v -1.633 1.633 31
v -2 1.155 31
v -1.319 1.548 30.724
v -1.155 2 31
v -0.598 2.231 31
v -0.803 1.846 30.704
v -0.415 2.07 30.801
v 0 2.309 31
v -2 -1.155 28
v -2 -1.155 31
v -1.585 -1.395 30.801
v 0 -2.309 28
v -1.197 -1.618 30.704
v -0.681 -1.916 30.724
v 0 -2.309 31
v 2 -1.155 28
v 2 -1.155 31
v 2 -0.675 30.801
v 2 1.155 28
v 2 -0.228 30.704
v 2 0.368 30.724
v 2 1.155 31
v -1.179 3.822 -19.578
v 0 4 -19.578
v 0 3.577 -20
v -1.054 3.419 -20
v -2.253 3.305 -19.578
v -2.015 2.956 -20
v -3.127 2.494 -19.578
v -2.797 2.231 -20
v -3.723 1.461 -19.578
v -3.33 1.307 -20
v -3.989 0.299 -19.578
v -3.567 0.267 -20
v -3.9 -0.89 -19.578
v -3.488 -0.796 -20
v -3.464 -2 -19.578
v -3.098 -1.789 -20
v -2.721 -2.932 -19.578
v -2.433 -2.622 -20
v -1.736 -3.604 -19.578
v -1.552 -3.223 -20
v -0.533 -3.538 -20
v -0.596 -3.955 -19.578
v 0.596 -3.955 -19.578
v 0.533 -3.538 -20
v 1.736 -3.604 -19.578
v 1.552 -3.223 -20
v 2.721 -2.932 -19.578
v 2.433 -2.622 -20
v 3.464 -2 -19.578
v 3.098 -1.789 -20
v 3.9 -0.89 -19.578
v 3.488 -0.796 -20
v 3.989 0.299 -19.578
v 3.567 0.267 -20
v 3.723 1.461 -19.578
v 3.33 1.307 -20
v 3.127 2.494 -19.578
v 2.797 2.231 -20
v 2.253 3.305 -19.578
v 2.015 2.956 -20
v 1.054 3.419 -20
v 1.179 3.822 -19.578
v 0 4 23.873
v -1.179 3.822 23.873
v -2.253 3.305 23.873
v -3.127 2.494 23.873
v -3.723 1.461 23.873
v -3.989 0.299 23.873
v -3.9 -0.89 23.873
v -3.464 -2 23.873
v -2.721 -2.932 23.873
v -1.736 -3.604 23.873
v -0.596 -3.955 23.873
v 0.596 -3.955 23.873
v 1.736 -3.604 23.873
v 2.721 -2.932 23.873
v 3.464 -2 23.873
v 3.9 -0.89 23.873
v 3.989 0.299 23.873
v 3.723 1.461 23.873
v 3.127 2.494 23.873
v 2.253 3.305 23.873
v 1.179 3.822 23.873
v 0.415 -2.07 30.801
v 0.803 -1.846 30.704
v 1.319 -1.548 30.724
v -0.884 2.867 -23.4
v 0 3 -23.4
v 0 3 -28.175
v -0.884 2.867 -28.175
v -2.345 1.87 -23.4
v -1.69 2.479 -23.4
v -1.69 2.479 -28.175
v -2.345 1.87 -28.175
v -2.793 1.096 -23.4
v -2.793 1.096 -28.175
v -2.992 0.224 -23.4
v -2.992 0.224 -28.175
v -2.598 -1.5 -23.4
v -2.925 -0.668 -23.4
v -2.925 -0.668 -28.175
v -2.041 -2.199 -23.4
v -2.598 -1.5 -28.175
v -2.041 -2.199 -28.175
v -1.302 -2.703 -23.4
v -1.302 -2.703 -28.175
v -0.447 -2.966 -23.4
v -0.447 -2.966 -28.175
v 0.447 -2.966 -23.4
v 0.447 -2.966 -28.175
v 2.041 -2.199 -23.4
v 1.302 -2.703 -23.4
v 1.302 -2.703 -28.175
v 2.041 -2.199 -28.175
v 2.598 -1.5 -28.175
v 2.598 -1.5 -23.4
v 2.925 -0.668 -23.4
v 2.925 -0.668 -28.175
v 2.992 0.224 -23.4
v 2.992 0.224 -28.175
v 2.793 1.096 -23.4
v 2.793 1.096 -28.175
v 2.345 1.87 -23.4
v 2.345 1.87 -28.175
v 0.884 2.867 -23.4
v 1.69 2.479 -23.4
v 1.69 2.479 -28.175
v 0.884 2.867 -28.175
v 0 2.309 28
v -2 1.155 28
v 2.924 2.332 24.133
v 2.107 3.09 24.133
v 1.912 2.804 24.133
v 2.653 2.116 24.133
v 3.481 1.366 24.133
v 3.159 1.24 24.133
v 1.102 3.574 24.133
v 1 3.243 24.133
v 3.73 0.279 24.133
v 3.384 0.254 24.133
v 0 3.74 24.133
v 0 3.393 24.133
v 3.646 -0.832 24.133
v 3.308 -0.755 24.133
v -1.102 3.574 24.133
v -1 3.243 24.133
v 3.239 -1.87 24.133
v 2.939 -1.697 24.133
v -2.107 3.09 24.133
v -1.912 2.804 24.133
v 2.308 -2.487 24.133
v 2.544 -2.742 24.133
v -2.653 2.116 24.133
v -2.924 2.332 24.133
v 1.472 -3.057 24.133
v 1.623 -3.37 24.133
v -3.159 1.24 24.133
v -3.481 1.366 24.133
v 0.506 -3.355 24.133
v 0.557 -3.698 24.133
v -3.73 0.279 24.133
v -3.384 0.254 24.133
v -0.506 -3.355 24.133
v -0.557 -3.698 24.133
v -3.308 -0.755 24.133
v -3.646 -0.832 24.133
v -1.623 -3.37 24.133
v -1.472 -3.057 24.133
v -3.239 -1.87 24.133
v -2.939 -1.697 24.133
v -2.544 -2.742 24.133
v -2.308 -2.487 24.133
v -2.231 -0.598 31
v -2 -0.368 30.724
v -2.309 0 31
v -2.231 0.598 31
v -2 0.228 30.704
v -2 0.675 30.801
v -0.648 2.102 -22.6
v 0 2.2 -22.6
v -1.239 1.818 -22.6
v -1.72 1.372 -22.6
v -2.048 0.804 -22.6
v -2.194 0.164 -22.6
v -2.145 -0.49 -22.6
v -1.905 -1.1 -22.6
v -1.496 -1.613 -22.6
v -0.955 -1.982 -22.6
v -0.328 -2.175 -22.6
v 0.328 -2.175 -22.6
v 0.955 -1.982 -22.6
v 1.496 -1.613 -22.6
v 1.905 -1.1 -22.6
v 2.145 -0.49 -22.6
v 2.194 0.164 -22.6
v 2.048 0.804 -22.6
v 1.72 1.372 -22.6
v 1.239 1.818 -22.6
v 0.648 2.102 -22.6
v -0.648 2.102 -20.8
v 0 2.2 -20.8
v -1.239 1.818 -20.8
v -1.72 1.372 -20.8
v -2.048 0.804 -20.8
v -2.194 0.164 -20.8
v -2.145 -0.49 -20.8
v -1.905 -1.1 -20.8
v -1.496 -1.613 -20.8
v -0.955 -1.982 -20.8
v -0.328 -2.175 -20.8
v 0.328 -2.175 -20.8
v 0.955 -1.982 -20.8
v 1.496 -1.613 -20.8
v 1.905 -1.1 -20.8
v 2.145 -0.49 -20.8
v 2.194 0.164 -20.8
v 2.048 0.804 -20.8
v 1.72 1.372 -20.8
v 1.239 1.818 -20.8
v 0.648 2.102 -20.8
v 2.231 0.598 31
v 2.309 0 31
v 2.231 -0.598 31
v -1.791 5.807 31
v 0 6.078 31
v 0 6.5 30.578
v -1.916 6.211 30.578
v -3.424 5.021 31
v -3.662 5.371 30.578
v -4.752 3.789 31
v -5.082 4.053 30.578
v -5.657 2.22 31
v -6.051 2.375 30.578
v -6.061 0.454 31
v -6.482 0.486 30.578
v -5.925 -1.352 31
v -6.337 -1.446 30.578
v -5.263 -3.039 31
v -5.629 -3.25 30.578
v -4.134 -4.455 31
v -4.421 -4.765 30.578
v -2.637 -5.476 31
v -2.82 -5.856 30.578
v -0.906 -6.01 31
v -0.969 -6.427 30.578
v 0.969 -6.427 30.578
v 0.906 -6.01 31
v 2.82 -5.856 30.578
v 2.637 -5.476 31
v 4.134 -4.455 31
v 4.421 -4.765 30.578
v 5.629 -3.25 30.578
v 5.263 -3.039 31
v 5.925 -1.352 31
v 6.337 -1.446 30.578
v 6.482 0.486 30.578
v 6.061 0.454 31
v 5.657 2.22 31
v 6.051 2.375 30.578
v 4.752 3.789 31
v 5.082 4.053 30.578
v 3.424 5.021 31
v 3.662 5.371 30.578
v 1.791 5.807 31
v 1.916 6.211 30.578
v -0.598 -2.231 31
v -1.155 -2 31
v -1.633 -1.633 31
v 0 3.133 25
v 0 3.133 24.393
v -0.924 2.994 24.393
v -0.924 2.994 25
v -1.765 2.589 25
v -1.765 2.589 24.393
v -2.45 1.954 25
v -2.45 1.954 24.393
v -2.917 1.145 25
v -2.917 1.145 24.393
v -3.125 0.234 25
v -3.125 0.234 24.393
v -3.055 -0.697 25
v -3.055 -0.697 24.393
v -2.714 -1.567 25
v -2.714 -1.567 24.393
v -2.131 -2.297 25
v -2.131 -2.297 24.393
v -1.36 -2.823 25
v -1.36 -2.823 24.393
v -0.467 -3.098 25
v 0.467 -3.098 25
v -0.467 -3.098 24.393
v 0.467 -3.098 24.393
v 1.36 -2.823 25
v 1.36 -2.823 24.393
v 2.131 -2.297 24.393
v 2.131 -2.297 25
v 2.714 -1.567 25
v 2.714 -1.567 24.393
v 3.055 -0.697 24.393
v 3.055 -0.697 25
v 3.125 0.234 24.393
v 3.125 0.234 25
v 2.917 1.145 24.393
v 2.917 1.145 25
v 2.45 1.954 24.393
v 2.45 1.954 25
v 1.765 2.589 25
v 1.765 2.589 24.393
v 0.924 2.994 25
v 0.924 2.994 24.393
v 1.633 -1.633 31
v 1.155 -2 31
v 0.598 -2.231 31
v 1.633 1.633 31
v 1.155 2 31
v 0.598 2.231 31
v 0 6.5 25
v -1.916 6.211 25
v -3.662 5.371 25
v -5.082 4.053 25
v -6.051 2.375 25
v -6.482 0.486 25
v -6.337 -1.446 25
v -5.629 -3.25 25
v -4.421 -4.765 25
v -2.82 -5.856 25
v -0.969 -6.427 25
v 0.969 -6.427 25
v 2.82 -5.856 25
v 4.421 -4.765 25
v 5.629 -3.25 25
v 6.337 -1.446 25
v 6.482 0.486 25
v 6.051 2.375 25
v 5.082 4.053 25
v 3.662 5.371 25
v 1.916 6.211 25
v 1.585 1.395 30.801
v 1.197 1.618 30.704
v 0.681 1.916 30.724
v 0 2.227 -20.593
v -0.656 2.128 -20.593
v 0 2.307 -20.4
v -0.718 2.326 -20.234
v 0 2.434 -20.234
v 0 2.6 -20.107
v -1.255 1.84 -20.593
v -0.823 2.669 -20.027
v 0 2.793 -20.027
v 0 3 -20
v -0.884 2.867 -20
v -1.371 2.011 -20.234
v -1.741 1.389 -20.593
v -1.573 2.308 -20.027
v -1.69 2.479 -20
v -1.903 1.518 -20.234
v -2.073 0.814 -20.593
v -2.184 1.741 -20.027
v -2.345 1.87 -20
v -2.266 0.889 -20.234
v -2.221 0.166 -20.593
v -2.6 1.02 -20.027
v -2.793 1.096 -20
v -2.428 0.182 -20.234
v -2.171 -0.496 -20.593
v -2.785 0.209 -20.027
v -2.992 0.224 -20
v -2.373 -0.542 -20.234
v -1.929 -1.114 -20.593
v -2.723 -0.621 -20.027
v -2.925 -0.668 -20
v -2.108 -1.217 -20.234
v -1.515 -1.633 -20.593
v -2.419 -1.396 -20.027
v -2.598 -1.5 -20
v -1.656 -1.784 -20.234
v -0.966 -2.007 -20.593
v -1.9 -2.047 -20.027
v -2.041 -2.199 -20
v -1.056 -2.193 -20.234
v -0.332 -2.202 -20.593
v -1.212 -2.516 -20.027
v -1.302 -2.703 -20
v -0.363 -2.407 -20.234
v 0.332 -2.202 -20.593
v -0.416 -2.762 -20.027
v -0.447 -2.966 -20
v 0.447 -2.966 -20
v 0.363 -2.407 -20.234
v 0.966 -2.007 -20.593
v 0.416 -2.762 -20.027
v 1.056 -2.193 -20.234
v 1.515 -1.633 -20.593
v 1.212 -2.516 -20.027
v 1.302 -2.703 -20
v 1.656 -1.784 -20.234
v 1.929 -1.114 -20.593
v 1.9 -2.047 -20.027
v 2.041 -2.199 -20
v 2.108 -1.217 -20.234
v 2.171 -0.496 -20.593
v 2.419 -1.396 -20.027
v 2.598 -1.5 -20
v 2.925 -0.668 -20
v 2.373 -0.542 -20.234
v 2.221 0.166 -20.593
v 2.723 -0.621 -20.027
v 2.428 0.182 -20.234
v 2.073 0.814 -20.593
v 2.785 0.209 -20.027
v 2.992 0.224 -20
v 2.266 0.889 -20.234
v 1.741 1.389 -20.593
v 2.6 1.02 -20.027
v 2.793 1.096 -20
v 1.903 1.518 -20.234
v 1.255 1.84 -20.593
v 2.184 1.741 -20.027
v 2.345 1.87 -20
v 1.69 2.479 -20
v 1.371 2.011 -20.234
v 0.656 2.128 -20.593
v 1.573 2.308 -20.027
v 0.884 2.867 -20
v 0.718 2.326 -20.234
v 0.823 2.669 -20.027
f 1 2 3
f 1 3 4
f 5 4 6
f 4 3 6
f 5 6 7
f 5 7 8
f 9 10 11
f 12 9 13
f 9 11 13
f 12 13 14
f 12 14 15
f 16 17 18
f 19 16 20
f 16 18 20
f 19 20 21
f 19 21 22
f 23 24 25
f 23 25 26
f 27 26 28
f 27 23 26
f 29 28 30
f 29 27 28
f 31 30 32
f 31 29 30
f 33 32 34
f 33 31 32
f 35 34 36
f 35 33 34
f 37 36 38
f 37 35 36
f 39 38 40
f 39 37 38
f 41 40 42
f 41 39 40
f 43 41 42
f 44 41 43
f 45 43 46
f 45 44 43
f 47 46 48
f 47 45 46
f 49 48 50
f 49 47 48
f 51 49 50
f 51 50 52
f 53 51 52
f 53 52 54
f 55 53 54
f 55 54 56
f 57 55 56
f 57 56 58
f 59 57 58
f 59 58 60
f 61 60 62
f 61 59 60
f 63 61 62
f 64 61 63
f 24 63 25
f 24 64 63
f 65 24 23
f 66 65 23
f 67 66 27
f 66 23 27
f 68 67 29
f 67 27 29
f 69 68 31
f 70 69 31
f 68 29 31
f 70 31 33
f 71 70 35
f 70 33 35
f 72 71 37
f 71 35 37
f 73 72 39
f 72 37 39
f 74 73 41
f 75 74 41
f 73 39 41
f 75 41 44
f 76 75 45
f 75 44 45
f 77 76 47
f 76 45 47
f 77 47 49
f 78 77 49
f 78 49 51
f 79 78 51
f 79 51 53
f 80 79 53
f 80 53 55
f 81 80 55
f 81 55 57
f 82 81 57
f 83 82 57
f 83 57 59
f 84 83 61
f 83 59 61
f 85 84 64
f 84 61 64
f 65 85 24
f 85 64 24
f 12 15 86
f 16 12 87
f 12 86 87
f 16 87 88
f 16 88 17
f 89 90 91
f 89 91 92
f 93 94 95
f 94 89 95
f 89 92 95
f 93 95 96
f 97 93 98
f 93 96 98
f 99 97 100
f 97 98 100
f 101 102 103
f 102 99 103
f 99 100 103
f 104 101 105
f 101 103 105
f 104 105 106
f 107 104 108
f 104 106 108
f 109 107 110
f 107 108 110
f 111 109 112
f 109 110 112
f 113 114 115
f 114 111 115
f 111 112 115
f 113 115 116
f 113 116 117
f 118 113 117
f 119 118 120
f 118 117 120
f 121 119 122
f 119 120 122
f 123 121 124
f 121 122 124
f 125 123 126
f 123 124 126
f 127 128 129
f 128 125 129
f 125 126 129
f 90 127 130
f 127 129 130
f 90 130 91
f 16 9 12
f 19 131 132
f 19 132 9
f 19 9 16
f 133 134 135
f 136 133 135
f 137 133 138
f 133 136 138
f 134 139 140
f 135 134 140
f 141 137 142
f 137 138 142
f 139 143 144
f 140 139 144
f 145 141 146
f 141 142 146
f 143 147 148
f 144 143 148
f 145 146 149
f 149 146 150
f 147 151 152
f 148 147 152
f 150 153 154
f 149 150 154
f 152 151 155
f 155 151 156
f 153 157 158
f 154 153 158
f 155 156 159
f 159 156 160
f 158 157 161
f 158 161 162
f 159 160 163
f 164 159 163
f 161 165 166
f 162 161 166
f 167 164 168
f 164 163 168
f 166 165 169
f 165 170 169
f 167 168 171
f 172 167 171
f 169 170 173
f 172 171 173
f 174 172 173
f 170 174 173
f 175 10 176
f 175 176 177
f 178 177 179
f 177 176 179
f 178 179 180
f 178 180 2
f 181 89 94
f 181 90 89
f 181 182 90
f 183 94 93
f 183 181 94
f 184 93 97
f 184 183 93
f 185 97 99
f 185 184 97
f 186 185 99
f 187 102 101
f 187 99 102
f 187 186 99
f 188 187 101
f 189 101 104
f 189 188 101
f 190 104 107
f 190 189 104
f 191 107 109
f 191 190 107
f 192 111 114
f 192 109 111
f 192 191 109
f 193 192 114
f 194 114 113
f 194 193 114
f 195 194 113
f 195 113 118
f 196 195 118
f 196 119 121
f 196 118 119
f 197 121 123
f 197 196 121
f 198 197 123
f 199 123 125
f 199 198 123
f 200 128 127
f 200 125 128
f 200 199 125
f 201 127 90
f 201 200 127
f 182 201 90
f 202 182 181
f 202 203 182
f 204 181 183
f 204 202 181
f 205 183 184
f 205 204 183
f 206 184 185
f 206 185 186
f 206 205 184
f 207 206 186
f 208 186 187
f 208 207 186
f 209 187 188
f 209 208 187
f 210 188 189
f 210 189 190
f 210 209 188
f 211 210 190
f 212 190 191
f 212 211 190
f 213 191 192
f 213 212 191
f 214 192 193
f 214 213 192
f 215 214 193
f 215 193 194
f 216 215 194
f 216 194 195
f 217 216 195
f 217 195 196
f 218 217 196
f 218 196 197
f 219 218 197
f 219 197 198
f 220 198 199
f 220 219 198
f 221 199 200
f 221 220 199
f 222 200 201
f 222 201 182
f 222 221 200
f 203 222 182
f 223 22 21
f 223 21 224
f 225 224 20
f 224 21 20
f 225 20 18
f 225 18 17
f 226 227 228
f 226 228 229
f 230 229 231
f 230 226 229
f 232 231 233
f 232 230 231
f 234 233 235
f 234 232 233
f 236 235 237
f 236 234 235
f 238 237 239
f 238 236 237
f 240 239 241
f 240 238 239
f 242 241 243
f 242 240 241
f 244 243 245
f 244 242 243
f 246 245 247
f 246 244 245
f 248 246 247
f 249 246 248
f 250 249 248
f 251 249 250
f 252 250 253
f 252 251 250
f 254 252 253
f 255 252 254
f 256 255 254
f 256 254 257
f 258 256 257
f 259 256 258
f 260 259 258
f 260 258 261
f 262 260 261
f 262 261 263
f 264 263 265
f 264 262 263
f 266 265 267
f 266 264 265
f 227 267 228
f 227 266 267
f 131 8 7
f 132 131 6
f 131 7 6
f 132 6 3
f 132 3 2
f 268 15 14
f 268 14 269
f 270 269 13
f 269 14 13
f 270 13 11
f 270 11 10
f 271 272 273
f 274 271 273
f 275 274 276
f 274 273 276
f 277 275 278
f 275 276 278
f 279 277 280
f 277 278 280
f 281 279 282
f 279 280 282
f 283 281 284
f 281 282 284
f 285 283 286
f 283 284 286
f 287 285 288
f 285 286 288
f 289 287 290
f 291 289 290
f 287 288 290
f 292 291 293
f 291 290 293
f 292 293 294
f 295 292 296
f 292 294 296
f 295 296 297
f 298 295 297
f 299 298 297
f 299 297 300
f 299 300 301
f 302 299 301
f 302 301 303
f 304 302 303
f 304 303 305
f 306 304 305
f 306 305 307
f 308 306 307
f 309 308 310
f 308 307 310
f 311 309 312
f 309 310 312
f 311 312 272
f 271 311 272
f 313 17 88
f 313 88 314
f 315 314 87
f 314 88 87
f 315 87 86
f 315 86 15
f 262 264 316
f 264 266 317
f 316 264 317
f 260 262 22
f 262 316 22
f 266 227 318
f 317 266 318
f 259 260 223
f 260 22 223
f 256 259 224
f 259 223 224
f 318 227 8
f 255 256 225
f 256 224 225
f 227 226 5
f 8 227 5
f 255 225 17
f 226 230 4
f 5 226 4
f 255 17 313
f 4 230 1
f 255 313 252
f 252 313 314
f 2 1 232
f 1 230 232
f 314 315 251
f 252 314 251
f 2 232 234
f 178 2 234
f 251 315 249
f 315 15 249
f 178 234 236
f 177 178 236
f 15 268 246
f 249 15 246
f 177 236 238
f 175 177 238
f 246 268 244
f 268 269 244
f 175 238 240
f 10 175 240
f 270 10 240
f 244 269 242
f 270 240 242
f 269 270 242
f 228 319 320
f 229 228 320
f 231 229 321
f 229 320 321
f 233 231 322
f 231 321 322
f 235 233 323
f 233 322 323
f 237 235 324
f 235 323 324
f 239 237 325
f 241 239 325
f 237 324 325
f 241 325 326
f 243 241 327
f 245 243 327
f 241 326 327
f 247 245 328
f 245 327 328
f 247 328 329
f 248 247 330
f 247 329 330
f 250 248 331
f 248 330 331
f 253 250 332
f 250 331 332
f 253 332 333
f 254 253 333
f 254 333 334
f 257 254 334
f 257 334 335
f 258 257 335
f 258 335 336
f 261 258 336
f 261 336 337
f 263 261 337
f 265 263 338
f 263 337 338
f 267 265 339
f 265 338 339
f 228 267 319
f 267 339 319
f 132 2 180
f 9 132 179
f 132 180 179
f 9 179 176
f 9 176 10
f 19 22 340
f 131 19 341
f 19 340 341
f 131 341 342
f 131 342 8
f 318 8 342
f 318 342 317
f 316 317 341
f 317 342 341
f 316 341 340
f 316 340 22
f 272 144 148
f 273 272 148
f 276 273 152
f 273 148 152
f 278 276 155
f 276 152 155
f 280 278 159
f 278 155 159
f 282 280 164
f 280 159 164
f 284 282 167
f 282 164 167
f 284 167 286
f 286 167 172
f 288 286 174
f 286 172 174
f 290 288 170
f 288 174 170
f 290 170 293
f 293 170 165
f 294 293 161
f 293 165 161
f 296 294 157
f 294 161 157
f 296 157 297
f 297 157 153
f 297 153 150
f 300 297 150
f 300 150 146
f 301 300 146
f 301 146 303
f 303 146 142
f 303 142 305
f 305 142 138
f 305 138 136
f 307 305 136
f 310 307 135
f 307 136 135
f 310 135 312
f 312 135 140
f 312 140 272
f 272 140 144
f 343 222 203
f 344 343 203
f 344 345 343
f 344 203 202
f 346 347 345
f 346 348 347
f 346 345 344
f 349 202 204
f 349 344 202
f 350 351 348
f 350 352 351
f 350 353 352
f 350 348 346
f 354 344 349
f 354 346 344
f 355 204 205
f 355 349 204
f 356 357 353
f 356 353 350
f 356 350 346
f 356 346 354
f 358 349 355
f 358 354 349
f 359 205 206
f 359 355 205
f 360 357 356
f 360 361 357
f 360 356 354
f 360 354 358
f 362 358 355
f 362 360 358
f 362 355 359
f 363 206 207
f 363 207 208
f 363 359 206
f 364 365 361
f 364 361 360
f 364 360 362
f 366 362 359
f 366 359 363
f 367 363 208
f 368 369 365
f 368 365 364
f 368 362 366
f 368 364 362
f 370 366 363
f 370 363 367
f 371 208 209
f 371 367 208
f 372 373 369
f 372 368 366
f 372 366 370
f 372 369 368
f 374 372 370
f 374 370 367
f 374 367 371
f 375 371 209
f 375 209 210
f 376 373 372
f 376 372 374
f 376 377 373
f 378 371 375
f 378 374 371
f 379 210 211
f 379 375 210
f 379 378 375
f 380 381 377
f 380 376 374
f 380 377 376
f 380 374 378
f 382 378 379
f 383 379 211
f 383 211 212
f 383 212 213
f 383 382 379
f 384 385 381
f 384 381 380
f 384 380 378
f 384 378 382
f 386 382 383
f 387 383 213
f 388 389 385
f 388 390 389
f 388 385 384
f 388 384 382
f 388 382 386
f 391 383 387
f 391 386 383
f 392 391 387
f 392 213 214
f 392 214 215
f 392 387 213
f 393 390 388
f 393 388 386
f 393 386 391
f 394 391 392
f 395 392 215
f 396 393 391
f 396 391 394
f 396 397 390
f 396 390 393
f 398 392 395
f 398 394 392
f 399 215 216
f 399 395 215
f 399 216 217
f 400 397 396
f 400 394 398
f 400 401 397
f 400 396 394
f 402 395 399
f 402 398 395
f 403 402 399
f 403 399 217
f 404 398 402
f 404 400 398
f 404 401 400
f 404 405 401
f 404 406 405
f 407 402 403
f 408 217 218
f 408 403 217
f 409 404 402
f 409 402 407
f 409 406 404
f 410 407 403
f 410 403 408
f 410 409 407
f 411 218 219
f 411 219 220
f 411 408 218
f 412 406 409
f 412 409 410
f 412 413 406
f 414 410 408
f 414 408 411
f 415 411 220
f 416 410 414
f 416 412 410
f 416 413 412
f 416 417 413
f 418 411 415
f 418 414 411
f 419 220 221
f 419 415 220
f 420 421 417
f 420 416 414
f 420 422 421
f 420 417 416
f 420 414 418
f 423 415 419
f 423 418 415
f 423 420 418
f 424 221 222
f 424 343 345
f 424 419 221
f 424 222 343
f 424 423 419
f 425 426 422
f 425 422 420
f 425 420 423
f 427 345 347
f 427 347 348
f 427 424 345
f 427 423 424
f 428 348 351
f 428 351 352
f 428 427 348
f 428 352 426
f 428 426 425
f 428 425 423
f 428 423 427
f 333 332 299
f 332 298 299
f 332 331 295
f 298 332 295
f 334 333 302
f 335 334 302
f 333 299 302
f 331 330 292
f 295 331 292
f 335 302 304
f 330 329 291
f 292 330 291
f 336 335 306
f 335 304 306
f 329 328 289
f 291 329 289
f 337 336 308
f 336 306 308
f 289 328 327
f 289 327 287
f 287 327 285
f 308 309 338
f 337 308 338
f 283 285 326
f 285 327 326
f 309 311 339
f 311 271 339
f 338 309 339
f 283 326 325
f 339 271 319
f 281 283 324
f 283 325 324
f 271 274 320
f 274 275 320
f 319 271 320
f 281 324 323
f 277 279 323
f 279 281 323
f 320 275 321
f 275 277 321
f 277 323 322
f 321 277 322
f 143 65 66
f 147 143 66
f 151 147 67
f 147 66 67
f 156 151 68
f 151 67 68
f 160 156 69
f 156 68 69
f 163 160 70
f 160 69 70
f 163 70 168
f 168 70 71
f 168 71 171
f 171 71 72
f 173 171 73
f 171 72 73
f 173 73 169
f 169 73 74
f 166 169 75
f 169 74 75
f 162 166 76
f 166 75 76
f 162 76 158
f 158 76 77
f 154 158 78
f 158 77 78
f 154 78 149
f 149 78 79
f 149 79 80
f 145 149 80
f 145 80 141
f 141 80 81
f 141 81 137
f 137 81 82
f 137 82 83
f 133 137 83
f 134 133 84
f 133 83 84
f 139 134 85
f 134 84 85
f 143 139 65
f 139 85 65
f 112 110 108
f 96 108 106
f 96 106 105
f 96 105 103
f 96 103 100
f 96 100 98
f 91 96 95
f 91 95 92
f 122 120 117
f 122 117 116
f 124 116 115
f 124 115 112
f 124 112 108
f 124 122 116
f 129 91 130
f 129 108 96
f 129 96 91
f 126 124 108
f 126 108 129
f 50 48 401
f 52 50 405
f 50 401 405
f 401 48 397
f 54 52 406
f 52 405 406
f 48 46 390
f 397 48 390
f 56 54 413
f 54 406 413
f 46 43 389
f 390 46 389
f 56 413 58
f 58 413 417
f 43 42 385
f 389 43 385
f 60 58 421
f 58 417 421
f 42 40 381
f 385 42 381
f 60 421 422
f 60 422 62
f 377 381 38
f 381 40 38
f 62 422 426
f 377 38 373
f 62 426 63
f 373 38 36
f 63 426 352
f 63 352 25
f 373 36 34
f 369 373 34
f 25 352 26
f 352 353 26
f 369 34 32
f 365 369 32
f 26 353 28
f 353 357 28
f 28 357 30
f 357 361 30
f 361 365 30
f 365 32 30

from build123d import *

# Parameters (mm, degrees)
SKETCH4_W          = 0.866666667
SKETCH4_H          = 0.866666667
CHAMFER1_SIZE      = 0.26
CHAMFER2_SIZE      = 0.75
CHAMFER3_SIZE      = 0.4225
CUT_EXTRUDE1_DEPTH = 3
SKETCH15_R         = 4
CUT_EXTRUDE3_DEPTH = 2.825


with BuildPart() as part:
    # Sketch3 → Revolve1 (revolve)
    with BuildSketch(Plane(origin=(0, 0, 0), x_dir=(0, 0, -1), z_dir=(1, 0, 0))):
        Polygon((-31, 6.5), (-25, 6.5), (-25, 4), (20, 4), (20, 3), (31, 3), (31, 0), (-31, 0), align=None)
    revolve(axis=Axis((0, 0, -31), (0, 0, 1)))

    # Sketch4 → Cut-Revolve1 (revolve, cut)
    with BuildSketch(Plane(origin=(0, 0, 0), x_dir=(0, 0, -1), z_dir=(1, 0, 0))):
        with Locations((-24.566666667, 3.566666667)):
            Rectangle(SKETCH4_W, SKETCH4_H)
    revolve(axis=Axis((0, 0, -31), (0, 0, 1)), mode=Mode.SUBTRACT)

    # Chamfer1
    chamfer1_edges = [part.edges().sort_by_distance(p)[0] for p in [
        (0, -3.133333333, 24.133333333),
        (0, -4, 24.133333333),
    ]]
    chamfer(chamfer1_edges, length=CHAMFER1_SIZE)

    # Sketch6 → Cut-Revolve2 (revolve, cut)
    with BuildSketch(Plane(origin=(0, 0, 0), x_dir=(0, 0, -1), z_dir=(1, 0, 0))):
        with BuildLine():
            Line((20, 4), (24.4, 4))
            Line((24.4, 4), (22.6, 2.2))
            Line((22.6, 2.2), (20.8, 2.2))
            ThreePointArc((20.8, 2.2), (20.234314575, 2.434314575), (20, 3))
            Line((20, 3), (20, 4))
        make_face()
    revolve(axis=Axis((0, 0, -31), (0, 0, 1)), mode=Mode.SUBTRACT)

    # Chamfer2
    chamfer2_edges = [part.edges().sort_by_distance(p)[0] for p in [
        (0, -3, -31),
    ]]
    chamfer(chamfer2_edges, length=CHAMFER2_SIZE)

    # Chamfer3
    chamfer3_edges = [part.edges().sort_by_distance(p)[0] for p in [
        (0, -4, -20),
        (0, -6.5, 31),
    ]]
    chamfer(chamfer3_edges, length=CHAMFER3_SIZE)

    # Sketch8 → Cut-Extrude1 (cut)
    with BuildSketch(Plane.XY.offset(31)):
        Polygon((2, 1.154700538), (0, 2.309401077), (-2, 1.154700538), (-2, -1.154700538), (0, -2.309401077), (2, -1.154700538), align=None)
    extrude(amount=-CUT_EXTRUDE1_DEPTH, mode=Mode.SUBTRACT)

    # Cut-Extrude2 cone 1 section (through the dimple's axis) → Cut-Extrude2 (revolve, cut)
    with BuildSketch(Plane(origin=(0, 0, 31), x_dir=(0, -1, 0), z_dir=(1, 0, 0))):
        Polygon((0, 0), (2.309401077, 0), (0, 2.309401077), align=None)
    revolve(axis=Axis((0, 0, 31), (0, 0, -1)), mode=Mode.SUBTRACT)

    # Sketch15 → Cut-Extrude3 (cut)
    with BuildSketch(Plane(origin=(0, 0, -31), x_dir=(-1, 0, 0), z_dir=(0, 0, -1))):
        with Locations(Location((0, 0, 0), (0, 0, 90))):
            Circle(SKETCH15_R)
    extrude(amount=-CUT_EXTRUDE3_DEPTH, mode=Mode.SUBTRACT)


solid = part.part
